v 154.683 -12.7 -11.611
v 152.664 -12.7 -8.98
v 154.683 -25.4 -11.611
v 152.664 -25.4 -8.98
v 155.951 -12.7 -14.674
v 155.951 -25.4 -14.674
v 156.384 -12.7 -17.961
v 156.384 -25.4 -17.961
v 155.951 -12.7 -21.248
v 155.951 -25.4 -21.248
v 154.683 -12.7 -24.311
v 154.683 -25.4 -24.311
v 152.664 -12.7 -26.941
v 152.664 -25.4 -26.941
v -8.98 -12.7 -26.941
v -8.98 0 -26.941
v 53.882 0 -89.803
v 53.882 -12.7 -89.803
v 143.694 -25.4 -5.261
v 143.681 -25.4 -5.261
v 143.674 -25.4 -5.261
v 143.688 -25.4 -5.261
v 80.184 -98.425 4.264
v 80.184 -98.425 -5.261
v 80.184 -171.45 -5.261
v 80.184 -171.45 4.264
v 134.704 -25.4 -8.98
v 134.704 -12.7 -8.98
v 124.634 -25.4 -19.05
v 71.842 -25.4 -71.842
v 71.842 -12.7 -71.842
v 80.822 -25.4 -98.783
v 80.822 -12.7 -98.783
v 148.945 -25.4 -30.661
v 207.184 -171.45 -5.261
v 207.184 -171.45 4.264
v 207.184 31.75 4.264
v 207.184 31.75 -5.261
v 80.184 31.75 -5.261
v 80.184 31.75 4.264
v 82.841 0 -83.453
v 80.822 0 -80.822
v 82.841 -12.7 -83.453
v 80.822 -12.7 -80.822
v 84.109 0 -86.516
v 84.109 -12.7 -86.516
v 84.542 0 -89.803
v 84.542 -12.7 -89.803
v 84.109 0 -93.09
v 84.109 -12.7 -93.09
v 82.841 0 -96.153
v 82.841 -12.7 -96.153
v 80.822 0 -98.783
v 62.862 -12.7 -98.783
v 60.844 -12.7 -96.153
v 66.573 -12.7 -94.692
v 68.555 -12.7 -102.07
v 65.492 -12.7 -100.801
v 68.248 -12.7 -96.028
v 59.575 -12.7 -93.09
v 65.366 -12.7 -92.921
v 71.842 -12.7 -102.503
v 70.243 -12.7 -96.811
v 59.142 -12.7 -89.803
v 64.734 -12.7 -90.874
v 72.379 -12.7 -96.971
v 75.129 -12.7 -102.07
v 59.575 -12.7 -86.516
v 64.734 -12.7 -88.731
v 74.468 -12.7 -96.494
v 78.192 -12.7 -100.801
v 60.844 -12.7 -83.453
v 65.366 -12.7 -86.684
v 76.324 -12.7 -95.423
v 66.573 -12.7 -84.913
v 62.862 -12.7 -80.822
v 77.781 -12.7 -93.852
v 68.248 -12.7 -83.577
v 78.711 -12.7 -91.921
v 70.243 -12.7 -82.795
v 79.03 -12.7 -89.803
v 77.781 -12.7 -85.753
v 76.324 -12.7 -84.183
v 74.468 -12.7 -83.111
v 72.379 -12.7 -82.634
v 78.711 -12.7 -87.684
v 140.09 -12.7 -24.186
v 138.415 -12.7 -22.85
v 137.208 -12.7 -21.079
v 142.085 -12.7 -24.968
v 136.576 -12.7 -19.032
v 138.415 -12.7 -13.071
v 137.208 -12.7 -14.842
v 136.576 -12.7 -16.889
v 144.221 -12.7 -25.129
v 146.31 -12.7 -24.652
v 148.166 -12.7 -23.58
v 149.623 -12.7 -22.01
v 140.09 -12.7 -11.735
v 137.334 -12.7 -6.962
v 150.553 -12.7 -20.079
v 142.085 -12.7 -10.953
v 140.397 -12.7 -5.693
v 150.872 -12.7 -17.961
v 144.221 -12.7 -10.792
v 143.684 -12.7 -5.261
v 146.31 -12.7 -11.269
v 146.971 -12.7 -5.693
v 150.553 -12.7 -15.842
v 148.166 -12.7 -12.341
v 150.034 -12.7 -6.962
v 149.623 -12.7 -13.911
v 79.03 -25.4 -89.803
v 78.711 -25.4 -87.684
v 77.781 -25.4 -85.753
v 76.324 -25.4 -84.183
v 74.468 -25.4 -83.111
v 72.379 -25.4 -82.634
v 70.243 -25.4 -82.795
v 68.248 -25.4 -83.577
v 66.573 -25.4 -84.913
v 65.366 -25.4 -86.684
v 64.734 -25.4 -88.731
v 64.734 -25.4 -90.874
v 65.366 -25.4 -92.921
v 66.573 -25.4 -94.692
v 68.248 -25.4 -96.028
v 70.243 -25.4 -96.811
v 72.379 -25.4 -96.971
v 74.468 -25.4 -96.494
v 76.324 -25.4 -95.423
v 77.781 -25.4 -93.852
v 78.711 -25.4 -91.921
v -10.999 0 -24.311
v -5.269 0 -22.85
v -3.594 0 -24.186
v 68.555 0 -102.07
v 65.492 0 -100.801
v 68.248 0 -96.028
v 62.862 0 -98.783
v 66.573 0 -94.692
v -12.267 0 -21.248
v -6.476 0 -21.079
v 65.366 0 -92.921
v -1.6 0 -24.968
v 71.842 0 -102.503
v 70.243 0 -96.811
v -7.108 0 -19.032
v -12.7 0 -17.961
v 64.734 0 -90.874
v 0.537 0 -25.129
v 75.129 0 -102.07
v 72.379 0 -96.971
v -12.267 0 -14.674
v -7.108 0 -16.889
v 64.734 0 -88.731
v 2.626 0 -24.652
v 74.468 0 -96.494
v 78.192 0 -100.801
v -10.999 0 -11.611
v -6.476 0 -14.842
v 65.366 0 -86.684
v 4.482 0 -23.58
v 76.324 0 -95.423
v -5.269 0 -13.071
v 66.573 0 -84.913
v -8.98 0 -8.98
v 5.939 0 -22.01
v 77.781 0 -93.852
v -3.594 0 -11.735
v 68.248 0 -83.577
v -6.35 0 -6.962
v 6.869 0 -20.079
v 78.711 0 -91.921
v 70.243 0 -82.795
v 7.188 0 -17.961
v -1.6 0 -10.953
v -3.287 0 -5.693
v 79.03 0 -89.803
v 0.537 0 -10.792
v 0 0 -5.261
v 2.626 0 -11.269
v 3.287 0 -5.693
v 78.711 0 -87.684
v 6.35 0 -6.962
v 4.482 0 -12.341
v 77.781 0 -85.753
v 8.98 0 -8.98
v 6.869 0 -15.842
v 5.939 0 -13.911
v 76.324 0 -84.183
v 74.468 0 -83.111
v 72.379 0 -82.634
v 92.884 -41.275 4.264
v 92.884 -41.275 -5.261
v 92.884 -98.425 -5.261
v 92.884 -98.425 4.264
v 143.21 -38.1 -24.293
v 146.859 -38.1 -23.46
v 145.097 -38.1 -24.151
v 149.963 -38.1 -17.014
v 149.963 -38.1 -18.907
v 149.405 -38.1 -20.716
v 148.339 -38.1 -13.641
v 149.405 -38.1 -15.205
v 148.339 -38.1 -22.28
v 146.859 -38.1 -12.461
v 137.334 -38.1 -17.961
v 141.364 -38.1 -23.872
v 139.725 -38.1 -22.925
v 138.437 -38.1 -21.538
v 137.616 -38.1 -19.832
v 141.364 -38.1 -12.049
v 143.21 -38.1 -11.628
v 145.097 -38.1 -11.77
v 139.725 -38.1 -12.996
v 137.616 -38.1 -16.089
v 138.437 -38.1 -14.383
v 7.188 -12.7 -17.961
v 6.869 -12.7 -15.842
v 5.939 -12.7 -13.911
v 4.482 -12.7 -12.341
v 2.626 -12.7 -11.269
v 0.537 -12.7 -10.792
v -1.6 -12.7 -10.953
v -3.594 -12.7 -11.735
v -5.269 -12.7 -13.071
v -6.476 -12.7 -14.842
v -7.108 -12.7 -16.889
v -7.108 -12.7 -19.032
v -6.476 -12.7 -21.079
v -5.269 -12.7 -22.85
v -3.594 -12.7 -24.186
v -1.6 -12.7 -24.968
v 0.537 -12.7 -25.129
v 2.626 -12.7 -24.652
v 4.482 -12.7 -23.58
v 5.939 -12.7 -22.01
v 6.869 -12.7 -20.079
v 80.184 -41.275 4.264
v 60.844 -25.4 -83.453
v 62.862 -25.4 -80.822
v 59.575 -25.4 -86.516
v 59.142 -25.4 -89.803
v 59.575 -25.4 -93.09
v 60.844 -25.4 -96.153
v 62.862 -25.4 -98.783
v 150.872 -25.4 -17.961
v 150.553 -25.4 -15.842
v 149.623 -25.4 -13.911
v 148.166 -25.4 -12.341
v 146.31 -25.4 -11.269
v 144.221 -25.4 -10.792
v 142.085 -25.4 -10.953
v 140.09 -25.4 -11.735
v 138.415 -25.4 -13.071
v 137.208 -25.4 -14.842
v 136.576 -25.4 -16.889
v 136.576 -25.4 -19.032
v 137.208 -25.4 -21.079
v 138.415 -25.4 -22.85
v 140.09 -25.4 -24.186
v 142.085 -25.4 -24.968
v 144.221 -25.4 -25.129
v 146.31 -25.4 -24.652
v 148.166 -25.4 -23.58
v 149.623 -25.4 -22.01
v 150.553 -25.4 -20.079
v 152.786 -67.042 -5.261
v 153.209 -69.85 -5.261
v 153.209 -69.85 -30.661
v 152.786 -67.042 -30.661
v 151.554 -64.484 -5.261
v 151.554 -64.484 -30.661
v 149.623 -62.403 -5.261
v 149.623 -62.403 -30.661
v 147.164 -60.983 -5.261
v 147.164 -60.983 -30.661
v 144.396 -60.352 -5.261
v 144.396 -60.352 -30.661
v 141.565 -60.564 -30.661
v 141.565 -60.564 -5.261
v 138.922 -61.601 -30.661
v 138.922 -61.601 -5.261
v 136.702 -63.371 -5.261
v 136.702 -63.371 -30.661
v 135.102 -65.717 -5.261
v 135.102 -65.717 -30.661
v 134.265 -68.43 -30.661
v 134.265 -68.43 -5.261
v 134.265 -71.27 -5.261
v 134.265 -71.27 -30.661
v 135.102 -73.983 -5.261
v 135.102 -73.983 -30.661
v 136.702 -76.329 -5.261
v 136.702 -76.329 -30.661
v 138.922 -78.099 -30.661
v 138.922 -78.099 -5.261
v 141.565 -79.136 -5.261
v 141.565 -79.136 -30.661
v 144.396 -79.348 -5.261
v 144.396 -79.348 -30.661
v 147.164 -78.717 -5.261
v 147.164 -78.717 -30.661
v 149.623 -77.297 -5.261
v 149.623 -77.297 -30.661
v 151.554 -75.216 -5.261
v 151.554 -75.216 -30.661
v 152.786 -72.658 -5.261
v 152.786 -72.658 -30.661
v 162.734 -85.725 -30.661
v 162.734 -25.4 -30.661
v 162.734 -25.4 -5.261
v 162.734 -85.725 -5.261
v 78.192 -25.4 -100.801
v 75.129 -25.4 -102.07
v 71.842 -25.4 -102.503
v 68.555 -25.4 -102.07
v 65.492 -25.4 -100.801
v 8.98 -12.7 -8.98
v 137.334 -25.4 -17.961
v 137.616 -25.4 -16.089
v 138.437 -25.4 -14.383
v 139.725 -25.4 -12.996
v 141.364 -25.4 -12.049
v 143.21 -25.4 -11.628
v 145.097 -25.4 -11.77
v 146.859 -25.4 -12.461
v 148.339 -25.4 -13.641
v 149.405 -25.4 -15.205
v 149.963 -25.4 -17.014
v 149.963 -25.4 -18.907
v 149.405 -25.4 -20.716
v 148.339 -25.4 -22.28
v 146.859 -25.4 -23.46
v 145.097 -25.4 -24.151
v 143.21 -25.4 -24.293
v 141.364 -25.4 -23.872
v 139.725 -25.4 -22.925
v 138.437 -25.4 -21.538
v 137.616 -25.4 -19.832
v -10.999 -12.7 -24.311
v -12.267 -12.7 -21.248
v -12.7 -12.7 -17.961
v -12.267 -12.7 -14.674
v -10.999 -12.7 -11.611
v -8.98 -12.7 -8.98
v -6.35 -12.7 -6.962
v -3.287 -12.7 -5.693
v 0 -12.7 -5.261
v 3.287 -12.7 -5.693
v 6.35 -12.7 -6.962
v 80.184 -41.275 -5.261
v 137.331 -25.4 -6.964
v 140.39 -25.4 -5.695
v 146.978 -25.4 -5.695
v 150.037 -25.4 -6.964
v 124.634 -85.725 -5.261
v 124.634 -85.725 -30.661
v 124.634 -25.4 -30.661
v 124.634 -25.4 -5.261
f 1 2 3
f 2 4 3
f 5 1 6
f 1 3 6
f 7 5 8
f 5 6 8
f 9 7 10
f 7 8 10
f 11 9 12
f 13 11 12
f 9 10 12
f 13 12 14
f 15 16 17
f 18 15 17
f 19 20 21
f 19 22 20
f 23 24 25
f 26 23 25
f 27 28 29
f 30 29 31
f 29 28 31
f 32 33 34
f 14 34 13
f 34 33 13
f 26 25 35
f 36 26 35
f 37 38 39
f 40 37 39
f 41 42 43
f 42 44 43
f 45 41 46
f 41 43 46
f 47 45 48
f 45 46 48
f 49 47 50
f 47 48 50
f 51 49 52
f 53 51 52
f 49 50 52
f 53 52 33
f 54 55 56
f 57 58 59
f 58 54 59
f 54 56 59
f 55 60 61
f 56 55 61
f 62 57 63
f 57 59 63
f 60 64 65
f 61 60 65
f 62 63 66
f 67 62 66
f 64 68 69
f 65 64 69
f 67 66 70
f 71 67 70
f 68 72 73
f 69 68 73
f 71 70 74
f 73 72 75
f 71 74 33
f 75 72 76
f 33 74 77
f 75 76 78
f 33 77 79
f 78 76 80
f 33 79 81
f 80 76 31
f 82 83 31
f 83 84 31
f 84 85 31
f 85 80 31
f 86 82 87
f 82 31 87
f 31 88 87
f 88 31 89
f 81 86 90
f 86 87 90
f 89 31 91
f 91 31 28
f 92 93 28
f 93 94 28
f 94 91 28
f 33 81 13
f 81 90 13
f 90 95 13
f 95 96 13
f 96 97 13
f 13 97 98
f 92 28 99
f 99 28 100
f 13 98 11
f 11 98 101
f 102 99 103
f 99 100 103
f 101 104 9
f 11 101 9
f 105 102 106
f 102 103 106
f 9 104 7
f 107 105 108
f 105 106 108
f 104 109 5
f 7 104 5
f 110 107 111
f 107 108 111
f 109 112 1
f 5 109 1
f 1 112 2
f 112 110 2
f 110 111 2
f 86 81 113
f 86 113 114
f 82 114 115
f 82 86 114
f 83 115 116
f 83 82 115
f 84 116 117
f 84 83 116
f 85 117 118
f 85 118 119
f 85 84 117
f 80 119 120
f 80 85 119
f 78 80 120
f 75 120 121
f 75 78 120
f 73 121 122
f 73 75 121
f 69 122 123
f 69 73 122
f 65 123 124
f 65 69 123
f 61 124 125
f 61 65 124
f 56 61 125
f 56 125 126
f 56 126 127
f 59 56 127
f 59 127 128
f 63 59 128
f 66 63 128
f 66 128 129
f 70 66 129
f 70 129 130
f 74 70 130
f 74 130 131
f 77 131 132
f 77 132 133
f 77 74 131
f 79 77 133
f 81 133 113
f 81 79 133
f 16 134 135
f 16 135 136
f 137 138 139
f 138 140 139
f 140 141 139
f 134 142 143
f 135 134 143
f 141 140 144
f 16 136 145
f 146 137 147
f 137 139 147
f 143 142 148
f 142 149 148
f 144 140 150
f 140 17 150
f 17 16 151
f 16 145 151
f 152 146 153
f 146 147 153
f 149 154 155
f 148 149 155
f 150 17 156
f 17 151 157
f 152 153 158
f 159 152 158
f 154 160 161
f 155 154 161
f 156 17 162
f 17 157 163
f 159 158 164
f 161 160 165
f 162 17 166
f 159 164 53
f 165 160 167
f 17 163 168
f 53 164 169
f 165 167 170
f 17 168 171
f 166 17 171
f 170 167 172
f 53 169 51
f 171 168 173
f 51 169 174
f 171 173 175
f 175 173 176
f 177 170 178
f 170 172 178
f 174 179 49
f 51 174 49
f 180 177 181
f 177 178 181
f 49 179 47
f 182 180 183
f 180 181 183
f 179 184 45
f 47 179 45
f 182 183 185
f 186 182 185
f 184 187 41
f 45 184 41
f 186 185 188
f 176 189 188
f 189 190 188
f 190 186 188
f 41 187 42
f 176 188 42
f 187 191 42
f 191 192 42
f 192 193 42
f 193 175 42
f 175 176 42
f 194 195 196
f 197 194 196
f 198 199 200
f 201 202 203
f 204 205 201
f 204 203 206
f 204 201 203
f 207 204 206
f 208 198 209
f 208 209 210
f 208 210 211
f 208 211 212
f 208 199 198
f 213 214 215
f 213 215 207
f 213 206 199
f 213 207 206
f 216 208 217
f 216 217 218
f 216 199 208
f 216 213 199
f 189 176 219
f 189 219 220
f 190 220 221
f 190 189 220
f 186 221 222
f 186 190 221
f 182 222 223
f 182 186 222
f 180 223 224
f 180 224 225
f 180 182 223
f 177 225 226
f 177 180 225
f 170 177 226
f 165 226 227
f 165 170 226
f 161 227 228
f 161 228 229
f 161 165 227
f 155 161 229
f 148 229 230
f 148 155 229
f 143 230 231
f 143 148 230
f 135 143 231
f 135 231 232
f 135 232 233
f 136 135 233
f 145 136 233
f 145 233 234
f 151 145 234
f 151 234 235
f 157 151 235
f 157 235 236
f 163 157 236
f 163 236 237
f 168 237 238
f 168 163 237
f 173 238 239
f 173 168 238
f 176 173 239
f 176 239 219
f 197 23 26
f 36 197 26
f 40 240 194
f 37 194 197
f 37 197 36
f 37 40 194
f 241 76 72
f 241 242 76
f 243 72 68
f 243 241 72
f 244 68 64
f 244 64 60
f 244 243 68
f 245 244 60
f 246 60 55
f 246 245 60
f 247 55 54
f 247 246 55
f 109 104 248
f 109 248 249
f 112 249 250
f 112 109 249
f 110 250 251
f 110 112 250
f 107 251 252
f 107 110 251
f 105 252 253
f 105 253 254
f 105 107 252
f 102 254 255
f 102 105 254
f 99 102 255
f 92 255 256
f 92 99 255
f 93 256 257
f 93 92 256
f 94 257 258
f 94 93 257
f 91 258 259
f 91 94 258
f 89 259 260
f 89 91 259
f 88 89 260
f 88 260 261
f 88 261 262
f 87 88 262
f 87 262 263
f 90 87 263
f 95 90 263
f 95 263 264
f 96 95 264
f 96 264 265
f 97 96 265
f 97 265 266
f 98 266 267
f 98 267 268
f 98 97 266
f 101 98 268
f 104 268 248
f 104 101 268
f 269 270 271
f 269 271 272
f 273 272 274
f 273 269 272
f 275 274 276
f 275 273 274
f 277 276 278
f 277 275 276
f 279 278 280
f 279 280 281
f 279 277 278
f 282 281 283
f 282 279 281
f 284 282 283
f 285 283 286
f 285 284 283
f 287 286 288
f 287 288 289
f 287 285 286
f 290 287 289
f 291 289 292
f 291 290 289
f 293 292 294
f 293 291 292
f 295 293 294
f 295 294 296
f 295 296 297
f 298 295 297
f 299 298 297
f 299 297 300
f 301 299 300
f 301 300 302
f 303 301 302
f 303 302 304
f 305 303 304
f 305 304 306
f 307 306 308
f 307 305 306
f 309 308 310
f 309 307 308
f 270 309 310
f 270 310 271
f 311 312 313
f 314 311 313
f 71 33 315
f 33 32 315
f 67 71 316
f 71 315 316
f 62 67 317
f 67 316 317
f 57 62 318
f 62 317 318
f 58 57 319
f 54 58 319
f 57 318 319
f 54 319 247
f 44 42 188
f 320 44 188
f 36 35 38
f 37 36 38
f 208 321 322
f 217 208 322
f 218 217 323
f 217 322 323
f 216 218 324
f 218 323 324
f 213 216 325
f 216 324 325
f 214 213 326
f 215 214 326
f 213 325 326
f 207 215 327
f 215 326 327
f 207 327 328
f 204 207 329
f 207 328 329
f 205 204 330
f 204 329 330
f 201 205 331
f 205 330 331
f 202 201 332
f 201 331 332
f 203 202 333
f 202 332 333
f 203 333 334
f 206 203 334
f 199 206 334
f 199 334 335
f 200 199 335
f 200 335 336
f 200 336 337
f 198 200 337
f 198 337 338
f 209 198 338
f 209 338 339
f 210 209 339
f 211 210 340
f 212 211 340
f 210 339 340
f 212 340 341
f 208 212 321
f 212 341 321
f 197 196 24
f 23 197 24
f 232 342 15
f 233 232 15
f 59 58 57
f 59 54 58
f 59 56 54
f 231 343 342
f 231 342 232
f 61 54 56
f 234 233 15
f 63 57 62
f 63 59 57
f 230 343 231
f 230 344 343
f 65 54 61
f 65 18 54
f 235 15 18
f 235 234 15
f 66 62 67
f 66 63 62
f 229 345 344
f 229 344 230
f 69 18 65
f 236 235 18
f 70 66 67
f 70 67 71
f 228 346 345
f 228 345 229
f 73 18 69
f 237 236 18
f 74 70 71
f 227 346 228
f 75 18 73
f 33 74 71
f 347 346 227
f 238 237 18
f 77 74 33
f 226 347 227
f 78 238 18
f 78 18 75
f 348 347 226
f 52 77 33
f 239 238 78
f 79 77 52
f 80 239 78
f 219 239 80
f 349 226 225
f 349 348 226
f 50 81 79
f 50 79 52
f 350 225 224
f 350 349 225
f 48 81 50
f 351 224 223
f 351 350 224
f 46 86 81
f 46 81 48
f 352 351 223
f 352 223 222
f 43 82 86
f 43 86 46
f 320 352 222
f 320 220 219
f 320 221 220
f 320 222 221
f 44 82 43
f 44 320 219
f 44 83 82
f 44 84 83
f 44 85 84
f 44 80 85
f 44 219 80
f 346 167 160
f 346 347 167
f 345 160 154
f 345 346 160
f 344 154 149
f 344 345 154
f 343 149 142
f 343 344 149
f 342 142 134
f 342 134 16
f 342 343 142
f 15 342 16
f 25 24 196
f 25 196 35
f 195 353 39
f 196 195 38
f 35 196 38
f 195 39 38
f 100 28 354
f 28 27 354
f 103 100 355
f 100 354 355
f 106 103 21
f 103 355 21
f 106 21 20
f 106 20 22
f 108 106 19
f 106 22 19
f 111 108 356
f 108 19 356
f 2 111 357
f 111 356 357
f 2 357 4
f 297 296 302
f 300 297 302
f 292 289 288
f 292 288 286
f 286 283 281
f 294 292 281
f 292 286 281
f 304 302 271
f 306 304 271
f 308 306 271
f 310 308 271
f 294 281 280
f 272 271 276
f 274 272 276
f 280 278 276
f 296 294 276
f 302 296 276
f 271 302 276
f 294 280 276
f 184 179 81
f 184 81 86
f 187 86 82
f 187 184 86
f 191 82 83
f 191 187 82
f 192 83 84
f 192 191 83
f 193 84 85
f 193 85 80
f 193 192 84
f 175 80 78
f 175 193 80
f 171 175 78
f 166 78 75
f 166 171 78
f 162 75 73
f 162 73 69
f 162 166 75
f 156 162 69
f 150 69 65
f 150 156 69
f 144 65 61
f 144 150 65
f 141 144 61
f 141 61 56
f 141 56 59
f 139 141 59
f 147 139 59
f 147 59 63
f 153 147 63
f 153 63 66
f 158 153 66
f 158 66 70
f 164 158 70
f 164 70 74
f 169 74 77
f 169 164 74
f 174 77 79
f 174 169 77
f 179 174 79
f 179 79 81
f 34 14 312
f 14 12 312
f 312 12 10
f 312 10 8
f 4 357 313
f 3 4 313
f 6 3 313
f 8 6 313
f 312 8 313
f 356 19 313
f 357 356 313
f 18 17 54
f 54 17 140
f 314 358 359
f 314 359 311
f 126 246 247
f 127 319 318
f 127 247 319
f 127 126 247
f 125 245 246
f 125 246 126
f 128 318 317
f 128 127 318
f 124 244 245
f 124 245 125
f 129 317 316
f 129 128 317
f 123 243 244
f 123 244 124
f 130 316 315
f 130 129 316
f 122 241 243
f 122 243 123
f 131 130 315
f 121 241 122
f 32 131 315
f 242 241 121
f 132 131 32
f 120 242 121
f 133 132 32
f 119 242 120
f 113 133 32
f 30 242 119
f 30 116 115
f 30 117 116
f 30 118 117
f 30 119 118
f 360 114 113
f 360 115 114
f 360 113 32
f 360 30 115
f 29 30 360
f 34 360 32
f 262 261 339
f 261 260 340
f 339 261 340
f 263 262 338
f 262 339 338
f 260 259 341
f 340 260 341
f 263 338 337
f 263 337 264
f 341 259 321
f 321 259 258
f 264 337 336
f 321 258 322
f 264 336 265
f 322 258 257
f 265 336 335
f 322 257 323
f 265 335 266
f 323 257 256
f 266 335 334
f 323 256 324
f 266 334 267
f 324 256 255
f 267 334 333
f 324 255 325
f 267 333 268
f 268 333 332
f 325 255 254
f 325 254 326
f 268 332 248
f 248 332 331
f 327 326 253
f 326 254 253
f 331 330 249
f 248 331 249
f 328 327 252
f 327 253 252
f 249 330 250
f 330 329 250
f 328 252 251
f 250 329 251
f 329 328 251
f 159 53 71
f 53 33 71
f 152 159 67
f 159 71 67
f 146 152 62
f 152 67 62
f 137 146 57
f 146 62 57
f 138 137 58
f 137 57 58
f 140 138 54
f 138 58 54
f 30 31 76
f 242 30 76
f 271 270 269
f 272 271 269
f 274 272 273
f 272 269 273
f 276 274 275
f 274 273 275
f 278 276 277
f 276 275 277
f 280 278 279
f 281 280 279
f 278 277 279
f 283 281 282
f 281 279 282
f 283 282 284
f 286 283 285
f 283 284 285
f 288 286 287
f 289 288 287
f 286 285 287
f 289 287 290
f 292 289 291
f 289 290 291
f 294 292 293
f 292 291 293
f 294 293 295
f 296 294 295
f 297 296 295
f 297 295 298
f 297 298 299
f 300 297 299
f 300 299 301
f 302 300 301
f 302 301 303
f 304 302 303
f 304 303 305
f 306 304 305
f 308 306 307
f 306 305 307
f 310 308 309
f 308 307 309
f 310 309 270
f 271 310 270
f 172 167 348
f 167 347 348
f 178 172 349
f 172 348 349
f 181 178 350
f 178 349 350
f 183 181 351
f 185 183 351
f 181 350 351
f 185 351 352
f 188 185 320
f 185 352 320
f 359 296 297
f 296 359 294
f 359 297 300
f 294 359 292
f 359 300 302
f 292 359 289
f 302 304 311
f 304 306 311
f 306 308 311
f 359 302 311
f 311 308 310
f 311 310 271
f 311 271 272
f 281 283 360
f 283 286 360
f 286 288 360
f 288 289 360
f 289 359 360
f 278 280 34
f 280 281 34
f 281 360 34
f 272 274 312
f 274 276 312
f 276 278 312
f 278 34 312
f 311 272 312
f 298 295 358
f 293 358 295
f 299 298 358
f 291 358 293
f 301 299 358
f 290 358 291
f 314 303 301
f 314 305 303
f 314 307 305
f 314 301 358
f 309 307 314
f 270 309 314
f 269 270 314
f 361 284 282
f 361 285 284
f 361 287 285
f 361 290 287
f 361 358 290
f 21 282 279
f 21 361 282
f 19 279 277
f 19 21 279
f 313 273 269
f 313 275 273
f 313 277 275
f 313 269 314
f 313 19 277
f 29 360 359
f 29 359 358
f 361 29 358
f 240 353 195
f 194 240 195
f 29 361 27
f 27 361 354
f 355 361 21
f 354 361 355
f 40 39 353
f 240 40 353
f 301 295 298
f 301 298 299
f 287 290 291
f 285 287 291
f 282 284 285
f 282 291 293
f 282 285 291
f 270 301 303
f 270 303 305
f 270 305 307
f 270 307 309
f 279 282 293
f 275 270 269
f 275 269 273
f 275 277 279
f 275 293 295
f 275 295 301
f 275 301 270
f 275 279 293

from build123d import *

# Parameters (mm, degrees)
F0_R      = 7.1882
F1_DEPTH  = 12.7
F2_START  = 12.7
F2_DEPTH  = 12.7
F3_R      = 12.69999
F3_2_R    = 12.69999
F5_START  = 25.4
F4_W      = 38.1
F4_H      = 25.4
F5_DEPTH  = 60.325
F6_DEPTH  = 19.05
F7_R      = 9.525
F8_DEPTH  = 25.4
F9_R      = 6.35
F10_DEPTH = 12.7
F12_DEPTH = 9.525
F13_DEPTH = 25.4


# Not quite as in the source:
# - a fillet or chamfer is up to 0.001 mm smaller than in the source, because OpenCascade refuses the exact size


with BuildPart() as f1:
    # F0 (on Front) → F1 (new body)
    with BuildSketch(Plane.XZ):
        Polygon((71.8420489686, -71.8420489686), (0, 0), (-17.9605122421, -17.9605122421), (53.8815367264, -89.8025612107), align=None)
        with Locations((0, -17.9605122421)):
            Circle(F0_R, mode=Mode.SUBTRACT)
        Polygon((89.8025612107, -89.8025612107), (71.8420489686, -71.8420489686), (53.8815367264, -89.8025612107), (71.8420489686, -107.7630734528), align=None)
        with Locations((71.8420489686, -89.8025612107)):
            Circle(F0_R, mode=Mode.SUBTRACT)
    extrude(amount=F1_DEPTH)

    # F3#2 (radius 12.7 in the source; OpenCascade refuses exactly that, so slightly less here)
    f3_2_edges = [f1.edges().sort_by_distance(p)[0] for p in [
        (89.802561, -6.35, -89.802561),
        (71.842049, -6.35, -107.763073),
        (0, -6.35, 0),
        (-17.960512, -6.35, -17.960512),
    ]]
    fillet(f3_2_edges, radius=F3_2_R)

    # F0 (on Front) → F6 (cut)
    with BuildSketch(Plane.XZ):
        with Locations((143.6840979371, -17.9605122421)):
            Circle(F0_R)
    extrude(amount=-F6_DEPTH, mode=Mode.SUBTRACT)


with BuildPart() as f2:
    # F0 (on Front) → F2 (new body)
    with BuildSketch(Plane.XZ.offset(F2_START)):
        Polygon((143.6840979371, 0), (71.8420489686, -71.8420489686), (89.8025612107, -89.8025612107), (161.6446101792, -17.9605122421), align=None)
        with Locations((143.6840979371, -17.9605122421)):
            Circle(F0_R, mode=Mode.SUBTRACT)
        Polygon((89.8025612107, -89.8025612107), (71.8420489686, -71.8420489686), (53.8815367264, -89.8025612107), (71.8420489686, -107.7630734528), align=None)
        with Locations((71.8420489686, -89.8025612107)):
            Circle(F0_R, mode=Mode.SUBTRACT)
    extrude(amount=F2_DEPTH)

    # F3 (radius 12.7 in the source; OpenCascade refuses exactly that, so slightly less here)
    f3_edges = [f2.edges().sort_by_distance(p)[0] for p in [
        (143.684098, -19.05, 0),
        (161.64461, -19.05, -17.960512),
        (53.881537, -19.05, -89.802561),
        (71.842049, -19.05, -107.763073),
    ]]
    fillet(f3_edges, radius=F3_R)

    # F4 (on face) → F5 (join)
    with BuildSketch(Plane.XZ.offset(F5_START)):
        with Locations((143.6840979371, -17.9605122421)):
            Rectangle(F4_W, F4_H)
    extrude(amount=F5_DEPTH)

    # F7 (on face) → F8 (cut)
    with BuildSketch(Plane.XY.offset(-5.2605122421)):
        with Locations((143.6840979371, -69.85)):
            Circle(F7_R)
    extrude(amount=-F8_DEPTH, mode=Mode.SUBTRACT)

    # F9 (on face) → F10 (cut)
    with BuildSketch(Plane(origin=(0, -25.4, 0), x_dir=(-1, 0, 0), z_dir=(0, 1, 0))):
        with Locations((-143.6840979371, -17.9605122421)):
            Circle(F9_R)
    extrude(amount=-F10_DEPTH, mode=Mode.SUBTRACT)


with BuildPart() as f12:
    # F11 (on face) → F12 (new body)
    with BuildSketch(Plane.XY.offset(-5.2605122421)):
        Polygon((80.1840979371, -98.425), (80.1840979371, -171.45), (207.1840979371, -171.45), (207.1840979371, 31.75), (80.1840979371, 31.75), (80.1840979371, -41.275), (92.8840979371, -41.275), (92.8840979371, -98.425), align=None)
    extrude(amount=F12_DEPTH)


with BuildPart() as f13:
    # F7 (on face) → F13 (new body)
    with BuildSketch(Plane.XY.offset(-5.2605122421)):
        with Locations((143.6840979371, -69.85)):
            Circle(F7_R)
    extrude(amount=-F13_DEPTH)


solid = Compound([f1.part, f2.part, f12.part, f13.part])
